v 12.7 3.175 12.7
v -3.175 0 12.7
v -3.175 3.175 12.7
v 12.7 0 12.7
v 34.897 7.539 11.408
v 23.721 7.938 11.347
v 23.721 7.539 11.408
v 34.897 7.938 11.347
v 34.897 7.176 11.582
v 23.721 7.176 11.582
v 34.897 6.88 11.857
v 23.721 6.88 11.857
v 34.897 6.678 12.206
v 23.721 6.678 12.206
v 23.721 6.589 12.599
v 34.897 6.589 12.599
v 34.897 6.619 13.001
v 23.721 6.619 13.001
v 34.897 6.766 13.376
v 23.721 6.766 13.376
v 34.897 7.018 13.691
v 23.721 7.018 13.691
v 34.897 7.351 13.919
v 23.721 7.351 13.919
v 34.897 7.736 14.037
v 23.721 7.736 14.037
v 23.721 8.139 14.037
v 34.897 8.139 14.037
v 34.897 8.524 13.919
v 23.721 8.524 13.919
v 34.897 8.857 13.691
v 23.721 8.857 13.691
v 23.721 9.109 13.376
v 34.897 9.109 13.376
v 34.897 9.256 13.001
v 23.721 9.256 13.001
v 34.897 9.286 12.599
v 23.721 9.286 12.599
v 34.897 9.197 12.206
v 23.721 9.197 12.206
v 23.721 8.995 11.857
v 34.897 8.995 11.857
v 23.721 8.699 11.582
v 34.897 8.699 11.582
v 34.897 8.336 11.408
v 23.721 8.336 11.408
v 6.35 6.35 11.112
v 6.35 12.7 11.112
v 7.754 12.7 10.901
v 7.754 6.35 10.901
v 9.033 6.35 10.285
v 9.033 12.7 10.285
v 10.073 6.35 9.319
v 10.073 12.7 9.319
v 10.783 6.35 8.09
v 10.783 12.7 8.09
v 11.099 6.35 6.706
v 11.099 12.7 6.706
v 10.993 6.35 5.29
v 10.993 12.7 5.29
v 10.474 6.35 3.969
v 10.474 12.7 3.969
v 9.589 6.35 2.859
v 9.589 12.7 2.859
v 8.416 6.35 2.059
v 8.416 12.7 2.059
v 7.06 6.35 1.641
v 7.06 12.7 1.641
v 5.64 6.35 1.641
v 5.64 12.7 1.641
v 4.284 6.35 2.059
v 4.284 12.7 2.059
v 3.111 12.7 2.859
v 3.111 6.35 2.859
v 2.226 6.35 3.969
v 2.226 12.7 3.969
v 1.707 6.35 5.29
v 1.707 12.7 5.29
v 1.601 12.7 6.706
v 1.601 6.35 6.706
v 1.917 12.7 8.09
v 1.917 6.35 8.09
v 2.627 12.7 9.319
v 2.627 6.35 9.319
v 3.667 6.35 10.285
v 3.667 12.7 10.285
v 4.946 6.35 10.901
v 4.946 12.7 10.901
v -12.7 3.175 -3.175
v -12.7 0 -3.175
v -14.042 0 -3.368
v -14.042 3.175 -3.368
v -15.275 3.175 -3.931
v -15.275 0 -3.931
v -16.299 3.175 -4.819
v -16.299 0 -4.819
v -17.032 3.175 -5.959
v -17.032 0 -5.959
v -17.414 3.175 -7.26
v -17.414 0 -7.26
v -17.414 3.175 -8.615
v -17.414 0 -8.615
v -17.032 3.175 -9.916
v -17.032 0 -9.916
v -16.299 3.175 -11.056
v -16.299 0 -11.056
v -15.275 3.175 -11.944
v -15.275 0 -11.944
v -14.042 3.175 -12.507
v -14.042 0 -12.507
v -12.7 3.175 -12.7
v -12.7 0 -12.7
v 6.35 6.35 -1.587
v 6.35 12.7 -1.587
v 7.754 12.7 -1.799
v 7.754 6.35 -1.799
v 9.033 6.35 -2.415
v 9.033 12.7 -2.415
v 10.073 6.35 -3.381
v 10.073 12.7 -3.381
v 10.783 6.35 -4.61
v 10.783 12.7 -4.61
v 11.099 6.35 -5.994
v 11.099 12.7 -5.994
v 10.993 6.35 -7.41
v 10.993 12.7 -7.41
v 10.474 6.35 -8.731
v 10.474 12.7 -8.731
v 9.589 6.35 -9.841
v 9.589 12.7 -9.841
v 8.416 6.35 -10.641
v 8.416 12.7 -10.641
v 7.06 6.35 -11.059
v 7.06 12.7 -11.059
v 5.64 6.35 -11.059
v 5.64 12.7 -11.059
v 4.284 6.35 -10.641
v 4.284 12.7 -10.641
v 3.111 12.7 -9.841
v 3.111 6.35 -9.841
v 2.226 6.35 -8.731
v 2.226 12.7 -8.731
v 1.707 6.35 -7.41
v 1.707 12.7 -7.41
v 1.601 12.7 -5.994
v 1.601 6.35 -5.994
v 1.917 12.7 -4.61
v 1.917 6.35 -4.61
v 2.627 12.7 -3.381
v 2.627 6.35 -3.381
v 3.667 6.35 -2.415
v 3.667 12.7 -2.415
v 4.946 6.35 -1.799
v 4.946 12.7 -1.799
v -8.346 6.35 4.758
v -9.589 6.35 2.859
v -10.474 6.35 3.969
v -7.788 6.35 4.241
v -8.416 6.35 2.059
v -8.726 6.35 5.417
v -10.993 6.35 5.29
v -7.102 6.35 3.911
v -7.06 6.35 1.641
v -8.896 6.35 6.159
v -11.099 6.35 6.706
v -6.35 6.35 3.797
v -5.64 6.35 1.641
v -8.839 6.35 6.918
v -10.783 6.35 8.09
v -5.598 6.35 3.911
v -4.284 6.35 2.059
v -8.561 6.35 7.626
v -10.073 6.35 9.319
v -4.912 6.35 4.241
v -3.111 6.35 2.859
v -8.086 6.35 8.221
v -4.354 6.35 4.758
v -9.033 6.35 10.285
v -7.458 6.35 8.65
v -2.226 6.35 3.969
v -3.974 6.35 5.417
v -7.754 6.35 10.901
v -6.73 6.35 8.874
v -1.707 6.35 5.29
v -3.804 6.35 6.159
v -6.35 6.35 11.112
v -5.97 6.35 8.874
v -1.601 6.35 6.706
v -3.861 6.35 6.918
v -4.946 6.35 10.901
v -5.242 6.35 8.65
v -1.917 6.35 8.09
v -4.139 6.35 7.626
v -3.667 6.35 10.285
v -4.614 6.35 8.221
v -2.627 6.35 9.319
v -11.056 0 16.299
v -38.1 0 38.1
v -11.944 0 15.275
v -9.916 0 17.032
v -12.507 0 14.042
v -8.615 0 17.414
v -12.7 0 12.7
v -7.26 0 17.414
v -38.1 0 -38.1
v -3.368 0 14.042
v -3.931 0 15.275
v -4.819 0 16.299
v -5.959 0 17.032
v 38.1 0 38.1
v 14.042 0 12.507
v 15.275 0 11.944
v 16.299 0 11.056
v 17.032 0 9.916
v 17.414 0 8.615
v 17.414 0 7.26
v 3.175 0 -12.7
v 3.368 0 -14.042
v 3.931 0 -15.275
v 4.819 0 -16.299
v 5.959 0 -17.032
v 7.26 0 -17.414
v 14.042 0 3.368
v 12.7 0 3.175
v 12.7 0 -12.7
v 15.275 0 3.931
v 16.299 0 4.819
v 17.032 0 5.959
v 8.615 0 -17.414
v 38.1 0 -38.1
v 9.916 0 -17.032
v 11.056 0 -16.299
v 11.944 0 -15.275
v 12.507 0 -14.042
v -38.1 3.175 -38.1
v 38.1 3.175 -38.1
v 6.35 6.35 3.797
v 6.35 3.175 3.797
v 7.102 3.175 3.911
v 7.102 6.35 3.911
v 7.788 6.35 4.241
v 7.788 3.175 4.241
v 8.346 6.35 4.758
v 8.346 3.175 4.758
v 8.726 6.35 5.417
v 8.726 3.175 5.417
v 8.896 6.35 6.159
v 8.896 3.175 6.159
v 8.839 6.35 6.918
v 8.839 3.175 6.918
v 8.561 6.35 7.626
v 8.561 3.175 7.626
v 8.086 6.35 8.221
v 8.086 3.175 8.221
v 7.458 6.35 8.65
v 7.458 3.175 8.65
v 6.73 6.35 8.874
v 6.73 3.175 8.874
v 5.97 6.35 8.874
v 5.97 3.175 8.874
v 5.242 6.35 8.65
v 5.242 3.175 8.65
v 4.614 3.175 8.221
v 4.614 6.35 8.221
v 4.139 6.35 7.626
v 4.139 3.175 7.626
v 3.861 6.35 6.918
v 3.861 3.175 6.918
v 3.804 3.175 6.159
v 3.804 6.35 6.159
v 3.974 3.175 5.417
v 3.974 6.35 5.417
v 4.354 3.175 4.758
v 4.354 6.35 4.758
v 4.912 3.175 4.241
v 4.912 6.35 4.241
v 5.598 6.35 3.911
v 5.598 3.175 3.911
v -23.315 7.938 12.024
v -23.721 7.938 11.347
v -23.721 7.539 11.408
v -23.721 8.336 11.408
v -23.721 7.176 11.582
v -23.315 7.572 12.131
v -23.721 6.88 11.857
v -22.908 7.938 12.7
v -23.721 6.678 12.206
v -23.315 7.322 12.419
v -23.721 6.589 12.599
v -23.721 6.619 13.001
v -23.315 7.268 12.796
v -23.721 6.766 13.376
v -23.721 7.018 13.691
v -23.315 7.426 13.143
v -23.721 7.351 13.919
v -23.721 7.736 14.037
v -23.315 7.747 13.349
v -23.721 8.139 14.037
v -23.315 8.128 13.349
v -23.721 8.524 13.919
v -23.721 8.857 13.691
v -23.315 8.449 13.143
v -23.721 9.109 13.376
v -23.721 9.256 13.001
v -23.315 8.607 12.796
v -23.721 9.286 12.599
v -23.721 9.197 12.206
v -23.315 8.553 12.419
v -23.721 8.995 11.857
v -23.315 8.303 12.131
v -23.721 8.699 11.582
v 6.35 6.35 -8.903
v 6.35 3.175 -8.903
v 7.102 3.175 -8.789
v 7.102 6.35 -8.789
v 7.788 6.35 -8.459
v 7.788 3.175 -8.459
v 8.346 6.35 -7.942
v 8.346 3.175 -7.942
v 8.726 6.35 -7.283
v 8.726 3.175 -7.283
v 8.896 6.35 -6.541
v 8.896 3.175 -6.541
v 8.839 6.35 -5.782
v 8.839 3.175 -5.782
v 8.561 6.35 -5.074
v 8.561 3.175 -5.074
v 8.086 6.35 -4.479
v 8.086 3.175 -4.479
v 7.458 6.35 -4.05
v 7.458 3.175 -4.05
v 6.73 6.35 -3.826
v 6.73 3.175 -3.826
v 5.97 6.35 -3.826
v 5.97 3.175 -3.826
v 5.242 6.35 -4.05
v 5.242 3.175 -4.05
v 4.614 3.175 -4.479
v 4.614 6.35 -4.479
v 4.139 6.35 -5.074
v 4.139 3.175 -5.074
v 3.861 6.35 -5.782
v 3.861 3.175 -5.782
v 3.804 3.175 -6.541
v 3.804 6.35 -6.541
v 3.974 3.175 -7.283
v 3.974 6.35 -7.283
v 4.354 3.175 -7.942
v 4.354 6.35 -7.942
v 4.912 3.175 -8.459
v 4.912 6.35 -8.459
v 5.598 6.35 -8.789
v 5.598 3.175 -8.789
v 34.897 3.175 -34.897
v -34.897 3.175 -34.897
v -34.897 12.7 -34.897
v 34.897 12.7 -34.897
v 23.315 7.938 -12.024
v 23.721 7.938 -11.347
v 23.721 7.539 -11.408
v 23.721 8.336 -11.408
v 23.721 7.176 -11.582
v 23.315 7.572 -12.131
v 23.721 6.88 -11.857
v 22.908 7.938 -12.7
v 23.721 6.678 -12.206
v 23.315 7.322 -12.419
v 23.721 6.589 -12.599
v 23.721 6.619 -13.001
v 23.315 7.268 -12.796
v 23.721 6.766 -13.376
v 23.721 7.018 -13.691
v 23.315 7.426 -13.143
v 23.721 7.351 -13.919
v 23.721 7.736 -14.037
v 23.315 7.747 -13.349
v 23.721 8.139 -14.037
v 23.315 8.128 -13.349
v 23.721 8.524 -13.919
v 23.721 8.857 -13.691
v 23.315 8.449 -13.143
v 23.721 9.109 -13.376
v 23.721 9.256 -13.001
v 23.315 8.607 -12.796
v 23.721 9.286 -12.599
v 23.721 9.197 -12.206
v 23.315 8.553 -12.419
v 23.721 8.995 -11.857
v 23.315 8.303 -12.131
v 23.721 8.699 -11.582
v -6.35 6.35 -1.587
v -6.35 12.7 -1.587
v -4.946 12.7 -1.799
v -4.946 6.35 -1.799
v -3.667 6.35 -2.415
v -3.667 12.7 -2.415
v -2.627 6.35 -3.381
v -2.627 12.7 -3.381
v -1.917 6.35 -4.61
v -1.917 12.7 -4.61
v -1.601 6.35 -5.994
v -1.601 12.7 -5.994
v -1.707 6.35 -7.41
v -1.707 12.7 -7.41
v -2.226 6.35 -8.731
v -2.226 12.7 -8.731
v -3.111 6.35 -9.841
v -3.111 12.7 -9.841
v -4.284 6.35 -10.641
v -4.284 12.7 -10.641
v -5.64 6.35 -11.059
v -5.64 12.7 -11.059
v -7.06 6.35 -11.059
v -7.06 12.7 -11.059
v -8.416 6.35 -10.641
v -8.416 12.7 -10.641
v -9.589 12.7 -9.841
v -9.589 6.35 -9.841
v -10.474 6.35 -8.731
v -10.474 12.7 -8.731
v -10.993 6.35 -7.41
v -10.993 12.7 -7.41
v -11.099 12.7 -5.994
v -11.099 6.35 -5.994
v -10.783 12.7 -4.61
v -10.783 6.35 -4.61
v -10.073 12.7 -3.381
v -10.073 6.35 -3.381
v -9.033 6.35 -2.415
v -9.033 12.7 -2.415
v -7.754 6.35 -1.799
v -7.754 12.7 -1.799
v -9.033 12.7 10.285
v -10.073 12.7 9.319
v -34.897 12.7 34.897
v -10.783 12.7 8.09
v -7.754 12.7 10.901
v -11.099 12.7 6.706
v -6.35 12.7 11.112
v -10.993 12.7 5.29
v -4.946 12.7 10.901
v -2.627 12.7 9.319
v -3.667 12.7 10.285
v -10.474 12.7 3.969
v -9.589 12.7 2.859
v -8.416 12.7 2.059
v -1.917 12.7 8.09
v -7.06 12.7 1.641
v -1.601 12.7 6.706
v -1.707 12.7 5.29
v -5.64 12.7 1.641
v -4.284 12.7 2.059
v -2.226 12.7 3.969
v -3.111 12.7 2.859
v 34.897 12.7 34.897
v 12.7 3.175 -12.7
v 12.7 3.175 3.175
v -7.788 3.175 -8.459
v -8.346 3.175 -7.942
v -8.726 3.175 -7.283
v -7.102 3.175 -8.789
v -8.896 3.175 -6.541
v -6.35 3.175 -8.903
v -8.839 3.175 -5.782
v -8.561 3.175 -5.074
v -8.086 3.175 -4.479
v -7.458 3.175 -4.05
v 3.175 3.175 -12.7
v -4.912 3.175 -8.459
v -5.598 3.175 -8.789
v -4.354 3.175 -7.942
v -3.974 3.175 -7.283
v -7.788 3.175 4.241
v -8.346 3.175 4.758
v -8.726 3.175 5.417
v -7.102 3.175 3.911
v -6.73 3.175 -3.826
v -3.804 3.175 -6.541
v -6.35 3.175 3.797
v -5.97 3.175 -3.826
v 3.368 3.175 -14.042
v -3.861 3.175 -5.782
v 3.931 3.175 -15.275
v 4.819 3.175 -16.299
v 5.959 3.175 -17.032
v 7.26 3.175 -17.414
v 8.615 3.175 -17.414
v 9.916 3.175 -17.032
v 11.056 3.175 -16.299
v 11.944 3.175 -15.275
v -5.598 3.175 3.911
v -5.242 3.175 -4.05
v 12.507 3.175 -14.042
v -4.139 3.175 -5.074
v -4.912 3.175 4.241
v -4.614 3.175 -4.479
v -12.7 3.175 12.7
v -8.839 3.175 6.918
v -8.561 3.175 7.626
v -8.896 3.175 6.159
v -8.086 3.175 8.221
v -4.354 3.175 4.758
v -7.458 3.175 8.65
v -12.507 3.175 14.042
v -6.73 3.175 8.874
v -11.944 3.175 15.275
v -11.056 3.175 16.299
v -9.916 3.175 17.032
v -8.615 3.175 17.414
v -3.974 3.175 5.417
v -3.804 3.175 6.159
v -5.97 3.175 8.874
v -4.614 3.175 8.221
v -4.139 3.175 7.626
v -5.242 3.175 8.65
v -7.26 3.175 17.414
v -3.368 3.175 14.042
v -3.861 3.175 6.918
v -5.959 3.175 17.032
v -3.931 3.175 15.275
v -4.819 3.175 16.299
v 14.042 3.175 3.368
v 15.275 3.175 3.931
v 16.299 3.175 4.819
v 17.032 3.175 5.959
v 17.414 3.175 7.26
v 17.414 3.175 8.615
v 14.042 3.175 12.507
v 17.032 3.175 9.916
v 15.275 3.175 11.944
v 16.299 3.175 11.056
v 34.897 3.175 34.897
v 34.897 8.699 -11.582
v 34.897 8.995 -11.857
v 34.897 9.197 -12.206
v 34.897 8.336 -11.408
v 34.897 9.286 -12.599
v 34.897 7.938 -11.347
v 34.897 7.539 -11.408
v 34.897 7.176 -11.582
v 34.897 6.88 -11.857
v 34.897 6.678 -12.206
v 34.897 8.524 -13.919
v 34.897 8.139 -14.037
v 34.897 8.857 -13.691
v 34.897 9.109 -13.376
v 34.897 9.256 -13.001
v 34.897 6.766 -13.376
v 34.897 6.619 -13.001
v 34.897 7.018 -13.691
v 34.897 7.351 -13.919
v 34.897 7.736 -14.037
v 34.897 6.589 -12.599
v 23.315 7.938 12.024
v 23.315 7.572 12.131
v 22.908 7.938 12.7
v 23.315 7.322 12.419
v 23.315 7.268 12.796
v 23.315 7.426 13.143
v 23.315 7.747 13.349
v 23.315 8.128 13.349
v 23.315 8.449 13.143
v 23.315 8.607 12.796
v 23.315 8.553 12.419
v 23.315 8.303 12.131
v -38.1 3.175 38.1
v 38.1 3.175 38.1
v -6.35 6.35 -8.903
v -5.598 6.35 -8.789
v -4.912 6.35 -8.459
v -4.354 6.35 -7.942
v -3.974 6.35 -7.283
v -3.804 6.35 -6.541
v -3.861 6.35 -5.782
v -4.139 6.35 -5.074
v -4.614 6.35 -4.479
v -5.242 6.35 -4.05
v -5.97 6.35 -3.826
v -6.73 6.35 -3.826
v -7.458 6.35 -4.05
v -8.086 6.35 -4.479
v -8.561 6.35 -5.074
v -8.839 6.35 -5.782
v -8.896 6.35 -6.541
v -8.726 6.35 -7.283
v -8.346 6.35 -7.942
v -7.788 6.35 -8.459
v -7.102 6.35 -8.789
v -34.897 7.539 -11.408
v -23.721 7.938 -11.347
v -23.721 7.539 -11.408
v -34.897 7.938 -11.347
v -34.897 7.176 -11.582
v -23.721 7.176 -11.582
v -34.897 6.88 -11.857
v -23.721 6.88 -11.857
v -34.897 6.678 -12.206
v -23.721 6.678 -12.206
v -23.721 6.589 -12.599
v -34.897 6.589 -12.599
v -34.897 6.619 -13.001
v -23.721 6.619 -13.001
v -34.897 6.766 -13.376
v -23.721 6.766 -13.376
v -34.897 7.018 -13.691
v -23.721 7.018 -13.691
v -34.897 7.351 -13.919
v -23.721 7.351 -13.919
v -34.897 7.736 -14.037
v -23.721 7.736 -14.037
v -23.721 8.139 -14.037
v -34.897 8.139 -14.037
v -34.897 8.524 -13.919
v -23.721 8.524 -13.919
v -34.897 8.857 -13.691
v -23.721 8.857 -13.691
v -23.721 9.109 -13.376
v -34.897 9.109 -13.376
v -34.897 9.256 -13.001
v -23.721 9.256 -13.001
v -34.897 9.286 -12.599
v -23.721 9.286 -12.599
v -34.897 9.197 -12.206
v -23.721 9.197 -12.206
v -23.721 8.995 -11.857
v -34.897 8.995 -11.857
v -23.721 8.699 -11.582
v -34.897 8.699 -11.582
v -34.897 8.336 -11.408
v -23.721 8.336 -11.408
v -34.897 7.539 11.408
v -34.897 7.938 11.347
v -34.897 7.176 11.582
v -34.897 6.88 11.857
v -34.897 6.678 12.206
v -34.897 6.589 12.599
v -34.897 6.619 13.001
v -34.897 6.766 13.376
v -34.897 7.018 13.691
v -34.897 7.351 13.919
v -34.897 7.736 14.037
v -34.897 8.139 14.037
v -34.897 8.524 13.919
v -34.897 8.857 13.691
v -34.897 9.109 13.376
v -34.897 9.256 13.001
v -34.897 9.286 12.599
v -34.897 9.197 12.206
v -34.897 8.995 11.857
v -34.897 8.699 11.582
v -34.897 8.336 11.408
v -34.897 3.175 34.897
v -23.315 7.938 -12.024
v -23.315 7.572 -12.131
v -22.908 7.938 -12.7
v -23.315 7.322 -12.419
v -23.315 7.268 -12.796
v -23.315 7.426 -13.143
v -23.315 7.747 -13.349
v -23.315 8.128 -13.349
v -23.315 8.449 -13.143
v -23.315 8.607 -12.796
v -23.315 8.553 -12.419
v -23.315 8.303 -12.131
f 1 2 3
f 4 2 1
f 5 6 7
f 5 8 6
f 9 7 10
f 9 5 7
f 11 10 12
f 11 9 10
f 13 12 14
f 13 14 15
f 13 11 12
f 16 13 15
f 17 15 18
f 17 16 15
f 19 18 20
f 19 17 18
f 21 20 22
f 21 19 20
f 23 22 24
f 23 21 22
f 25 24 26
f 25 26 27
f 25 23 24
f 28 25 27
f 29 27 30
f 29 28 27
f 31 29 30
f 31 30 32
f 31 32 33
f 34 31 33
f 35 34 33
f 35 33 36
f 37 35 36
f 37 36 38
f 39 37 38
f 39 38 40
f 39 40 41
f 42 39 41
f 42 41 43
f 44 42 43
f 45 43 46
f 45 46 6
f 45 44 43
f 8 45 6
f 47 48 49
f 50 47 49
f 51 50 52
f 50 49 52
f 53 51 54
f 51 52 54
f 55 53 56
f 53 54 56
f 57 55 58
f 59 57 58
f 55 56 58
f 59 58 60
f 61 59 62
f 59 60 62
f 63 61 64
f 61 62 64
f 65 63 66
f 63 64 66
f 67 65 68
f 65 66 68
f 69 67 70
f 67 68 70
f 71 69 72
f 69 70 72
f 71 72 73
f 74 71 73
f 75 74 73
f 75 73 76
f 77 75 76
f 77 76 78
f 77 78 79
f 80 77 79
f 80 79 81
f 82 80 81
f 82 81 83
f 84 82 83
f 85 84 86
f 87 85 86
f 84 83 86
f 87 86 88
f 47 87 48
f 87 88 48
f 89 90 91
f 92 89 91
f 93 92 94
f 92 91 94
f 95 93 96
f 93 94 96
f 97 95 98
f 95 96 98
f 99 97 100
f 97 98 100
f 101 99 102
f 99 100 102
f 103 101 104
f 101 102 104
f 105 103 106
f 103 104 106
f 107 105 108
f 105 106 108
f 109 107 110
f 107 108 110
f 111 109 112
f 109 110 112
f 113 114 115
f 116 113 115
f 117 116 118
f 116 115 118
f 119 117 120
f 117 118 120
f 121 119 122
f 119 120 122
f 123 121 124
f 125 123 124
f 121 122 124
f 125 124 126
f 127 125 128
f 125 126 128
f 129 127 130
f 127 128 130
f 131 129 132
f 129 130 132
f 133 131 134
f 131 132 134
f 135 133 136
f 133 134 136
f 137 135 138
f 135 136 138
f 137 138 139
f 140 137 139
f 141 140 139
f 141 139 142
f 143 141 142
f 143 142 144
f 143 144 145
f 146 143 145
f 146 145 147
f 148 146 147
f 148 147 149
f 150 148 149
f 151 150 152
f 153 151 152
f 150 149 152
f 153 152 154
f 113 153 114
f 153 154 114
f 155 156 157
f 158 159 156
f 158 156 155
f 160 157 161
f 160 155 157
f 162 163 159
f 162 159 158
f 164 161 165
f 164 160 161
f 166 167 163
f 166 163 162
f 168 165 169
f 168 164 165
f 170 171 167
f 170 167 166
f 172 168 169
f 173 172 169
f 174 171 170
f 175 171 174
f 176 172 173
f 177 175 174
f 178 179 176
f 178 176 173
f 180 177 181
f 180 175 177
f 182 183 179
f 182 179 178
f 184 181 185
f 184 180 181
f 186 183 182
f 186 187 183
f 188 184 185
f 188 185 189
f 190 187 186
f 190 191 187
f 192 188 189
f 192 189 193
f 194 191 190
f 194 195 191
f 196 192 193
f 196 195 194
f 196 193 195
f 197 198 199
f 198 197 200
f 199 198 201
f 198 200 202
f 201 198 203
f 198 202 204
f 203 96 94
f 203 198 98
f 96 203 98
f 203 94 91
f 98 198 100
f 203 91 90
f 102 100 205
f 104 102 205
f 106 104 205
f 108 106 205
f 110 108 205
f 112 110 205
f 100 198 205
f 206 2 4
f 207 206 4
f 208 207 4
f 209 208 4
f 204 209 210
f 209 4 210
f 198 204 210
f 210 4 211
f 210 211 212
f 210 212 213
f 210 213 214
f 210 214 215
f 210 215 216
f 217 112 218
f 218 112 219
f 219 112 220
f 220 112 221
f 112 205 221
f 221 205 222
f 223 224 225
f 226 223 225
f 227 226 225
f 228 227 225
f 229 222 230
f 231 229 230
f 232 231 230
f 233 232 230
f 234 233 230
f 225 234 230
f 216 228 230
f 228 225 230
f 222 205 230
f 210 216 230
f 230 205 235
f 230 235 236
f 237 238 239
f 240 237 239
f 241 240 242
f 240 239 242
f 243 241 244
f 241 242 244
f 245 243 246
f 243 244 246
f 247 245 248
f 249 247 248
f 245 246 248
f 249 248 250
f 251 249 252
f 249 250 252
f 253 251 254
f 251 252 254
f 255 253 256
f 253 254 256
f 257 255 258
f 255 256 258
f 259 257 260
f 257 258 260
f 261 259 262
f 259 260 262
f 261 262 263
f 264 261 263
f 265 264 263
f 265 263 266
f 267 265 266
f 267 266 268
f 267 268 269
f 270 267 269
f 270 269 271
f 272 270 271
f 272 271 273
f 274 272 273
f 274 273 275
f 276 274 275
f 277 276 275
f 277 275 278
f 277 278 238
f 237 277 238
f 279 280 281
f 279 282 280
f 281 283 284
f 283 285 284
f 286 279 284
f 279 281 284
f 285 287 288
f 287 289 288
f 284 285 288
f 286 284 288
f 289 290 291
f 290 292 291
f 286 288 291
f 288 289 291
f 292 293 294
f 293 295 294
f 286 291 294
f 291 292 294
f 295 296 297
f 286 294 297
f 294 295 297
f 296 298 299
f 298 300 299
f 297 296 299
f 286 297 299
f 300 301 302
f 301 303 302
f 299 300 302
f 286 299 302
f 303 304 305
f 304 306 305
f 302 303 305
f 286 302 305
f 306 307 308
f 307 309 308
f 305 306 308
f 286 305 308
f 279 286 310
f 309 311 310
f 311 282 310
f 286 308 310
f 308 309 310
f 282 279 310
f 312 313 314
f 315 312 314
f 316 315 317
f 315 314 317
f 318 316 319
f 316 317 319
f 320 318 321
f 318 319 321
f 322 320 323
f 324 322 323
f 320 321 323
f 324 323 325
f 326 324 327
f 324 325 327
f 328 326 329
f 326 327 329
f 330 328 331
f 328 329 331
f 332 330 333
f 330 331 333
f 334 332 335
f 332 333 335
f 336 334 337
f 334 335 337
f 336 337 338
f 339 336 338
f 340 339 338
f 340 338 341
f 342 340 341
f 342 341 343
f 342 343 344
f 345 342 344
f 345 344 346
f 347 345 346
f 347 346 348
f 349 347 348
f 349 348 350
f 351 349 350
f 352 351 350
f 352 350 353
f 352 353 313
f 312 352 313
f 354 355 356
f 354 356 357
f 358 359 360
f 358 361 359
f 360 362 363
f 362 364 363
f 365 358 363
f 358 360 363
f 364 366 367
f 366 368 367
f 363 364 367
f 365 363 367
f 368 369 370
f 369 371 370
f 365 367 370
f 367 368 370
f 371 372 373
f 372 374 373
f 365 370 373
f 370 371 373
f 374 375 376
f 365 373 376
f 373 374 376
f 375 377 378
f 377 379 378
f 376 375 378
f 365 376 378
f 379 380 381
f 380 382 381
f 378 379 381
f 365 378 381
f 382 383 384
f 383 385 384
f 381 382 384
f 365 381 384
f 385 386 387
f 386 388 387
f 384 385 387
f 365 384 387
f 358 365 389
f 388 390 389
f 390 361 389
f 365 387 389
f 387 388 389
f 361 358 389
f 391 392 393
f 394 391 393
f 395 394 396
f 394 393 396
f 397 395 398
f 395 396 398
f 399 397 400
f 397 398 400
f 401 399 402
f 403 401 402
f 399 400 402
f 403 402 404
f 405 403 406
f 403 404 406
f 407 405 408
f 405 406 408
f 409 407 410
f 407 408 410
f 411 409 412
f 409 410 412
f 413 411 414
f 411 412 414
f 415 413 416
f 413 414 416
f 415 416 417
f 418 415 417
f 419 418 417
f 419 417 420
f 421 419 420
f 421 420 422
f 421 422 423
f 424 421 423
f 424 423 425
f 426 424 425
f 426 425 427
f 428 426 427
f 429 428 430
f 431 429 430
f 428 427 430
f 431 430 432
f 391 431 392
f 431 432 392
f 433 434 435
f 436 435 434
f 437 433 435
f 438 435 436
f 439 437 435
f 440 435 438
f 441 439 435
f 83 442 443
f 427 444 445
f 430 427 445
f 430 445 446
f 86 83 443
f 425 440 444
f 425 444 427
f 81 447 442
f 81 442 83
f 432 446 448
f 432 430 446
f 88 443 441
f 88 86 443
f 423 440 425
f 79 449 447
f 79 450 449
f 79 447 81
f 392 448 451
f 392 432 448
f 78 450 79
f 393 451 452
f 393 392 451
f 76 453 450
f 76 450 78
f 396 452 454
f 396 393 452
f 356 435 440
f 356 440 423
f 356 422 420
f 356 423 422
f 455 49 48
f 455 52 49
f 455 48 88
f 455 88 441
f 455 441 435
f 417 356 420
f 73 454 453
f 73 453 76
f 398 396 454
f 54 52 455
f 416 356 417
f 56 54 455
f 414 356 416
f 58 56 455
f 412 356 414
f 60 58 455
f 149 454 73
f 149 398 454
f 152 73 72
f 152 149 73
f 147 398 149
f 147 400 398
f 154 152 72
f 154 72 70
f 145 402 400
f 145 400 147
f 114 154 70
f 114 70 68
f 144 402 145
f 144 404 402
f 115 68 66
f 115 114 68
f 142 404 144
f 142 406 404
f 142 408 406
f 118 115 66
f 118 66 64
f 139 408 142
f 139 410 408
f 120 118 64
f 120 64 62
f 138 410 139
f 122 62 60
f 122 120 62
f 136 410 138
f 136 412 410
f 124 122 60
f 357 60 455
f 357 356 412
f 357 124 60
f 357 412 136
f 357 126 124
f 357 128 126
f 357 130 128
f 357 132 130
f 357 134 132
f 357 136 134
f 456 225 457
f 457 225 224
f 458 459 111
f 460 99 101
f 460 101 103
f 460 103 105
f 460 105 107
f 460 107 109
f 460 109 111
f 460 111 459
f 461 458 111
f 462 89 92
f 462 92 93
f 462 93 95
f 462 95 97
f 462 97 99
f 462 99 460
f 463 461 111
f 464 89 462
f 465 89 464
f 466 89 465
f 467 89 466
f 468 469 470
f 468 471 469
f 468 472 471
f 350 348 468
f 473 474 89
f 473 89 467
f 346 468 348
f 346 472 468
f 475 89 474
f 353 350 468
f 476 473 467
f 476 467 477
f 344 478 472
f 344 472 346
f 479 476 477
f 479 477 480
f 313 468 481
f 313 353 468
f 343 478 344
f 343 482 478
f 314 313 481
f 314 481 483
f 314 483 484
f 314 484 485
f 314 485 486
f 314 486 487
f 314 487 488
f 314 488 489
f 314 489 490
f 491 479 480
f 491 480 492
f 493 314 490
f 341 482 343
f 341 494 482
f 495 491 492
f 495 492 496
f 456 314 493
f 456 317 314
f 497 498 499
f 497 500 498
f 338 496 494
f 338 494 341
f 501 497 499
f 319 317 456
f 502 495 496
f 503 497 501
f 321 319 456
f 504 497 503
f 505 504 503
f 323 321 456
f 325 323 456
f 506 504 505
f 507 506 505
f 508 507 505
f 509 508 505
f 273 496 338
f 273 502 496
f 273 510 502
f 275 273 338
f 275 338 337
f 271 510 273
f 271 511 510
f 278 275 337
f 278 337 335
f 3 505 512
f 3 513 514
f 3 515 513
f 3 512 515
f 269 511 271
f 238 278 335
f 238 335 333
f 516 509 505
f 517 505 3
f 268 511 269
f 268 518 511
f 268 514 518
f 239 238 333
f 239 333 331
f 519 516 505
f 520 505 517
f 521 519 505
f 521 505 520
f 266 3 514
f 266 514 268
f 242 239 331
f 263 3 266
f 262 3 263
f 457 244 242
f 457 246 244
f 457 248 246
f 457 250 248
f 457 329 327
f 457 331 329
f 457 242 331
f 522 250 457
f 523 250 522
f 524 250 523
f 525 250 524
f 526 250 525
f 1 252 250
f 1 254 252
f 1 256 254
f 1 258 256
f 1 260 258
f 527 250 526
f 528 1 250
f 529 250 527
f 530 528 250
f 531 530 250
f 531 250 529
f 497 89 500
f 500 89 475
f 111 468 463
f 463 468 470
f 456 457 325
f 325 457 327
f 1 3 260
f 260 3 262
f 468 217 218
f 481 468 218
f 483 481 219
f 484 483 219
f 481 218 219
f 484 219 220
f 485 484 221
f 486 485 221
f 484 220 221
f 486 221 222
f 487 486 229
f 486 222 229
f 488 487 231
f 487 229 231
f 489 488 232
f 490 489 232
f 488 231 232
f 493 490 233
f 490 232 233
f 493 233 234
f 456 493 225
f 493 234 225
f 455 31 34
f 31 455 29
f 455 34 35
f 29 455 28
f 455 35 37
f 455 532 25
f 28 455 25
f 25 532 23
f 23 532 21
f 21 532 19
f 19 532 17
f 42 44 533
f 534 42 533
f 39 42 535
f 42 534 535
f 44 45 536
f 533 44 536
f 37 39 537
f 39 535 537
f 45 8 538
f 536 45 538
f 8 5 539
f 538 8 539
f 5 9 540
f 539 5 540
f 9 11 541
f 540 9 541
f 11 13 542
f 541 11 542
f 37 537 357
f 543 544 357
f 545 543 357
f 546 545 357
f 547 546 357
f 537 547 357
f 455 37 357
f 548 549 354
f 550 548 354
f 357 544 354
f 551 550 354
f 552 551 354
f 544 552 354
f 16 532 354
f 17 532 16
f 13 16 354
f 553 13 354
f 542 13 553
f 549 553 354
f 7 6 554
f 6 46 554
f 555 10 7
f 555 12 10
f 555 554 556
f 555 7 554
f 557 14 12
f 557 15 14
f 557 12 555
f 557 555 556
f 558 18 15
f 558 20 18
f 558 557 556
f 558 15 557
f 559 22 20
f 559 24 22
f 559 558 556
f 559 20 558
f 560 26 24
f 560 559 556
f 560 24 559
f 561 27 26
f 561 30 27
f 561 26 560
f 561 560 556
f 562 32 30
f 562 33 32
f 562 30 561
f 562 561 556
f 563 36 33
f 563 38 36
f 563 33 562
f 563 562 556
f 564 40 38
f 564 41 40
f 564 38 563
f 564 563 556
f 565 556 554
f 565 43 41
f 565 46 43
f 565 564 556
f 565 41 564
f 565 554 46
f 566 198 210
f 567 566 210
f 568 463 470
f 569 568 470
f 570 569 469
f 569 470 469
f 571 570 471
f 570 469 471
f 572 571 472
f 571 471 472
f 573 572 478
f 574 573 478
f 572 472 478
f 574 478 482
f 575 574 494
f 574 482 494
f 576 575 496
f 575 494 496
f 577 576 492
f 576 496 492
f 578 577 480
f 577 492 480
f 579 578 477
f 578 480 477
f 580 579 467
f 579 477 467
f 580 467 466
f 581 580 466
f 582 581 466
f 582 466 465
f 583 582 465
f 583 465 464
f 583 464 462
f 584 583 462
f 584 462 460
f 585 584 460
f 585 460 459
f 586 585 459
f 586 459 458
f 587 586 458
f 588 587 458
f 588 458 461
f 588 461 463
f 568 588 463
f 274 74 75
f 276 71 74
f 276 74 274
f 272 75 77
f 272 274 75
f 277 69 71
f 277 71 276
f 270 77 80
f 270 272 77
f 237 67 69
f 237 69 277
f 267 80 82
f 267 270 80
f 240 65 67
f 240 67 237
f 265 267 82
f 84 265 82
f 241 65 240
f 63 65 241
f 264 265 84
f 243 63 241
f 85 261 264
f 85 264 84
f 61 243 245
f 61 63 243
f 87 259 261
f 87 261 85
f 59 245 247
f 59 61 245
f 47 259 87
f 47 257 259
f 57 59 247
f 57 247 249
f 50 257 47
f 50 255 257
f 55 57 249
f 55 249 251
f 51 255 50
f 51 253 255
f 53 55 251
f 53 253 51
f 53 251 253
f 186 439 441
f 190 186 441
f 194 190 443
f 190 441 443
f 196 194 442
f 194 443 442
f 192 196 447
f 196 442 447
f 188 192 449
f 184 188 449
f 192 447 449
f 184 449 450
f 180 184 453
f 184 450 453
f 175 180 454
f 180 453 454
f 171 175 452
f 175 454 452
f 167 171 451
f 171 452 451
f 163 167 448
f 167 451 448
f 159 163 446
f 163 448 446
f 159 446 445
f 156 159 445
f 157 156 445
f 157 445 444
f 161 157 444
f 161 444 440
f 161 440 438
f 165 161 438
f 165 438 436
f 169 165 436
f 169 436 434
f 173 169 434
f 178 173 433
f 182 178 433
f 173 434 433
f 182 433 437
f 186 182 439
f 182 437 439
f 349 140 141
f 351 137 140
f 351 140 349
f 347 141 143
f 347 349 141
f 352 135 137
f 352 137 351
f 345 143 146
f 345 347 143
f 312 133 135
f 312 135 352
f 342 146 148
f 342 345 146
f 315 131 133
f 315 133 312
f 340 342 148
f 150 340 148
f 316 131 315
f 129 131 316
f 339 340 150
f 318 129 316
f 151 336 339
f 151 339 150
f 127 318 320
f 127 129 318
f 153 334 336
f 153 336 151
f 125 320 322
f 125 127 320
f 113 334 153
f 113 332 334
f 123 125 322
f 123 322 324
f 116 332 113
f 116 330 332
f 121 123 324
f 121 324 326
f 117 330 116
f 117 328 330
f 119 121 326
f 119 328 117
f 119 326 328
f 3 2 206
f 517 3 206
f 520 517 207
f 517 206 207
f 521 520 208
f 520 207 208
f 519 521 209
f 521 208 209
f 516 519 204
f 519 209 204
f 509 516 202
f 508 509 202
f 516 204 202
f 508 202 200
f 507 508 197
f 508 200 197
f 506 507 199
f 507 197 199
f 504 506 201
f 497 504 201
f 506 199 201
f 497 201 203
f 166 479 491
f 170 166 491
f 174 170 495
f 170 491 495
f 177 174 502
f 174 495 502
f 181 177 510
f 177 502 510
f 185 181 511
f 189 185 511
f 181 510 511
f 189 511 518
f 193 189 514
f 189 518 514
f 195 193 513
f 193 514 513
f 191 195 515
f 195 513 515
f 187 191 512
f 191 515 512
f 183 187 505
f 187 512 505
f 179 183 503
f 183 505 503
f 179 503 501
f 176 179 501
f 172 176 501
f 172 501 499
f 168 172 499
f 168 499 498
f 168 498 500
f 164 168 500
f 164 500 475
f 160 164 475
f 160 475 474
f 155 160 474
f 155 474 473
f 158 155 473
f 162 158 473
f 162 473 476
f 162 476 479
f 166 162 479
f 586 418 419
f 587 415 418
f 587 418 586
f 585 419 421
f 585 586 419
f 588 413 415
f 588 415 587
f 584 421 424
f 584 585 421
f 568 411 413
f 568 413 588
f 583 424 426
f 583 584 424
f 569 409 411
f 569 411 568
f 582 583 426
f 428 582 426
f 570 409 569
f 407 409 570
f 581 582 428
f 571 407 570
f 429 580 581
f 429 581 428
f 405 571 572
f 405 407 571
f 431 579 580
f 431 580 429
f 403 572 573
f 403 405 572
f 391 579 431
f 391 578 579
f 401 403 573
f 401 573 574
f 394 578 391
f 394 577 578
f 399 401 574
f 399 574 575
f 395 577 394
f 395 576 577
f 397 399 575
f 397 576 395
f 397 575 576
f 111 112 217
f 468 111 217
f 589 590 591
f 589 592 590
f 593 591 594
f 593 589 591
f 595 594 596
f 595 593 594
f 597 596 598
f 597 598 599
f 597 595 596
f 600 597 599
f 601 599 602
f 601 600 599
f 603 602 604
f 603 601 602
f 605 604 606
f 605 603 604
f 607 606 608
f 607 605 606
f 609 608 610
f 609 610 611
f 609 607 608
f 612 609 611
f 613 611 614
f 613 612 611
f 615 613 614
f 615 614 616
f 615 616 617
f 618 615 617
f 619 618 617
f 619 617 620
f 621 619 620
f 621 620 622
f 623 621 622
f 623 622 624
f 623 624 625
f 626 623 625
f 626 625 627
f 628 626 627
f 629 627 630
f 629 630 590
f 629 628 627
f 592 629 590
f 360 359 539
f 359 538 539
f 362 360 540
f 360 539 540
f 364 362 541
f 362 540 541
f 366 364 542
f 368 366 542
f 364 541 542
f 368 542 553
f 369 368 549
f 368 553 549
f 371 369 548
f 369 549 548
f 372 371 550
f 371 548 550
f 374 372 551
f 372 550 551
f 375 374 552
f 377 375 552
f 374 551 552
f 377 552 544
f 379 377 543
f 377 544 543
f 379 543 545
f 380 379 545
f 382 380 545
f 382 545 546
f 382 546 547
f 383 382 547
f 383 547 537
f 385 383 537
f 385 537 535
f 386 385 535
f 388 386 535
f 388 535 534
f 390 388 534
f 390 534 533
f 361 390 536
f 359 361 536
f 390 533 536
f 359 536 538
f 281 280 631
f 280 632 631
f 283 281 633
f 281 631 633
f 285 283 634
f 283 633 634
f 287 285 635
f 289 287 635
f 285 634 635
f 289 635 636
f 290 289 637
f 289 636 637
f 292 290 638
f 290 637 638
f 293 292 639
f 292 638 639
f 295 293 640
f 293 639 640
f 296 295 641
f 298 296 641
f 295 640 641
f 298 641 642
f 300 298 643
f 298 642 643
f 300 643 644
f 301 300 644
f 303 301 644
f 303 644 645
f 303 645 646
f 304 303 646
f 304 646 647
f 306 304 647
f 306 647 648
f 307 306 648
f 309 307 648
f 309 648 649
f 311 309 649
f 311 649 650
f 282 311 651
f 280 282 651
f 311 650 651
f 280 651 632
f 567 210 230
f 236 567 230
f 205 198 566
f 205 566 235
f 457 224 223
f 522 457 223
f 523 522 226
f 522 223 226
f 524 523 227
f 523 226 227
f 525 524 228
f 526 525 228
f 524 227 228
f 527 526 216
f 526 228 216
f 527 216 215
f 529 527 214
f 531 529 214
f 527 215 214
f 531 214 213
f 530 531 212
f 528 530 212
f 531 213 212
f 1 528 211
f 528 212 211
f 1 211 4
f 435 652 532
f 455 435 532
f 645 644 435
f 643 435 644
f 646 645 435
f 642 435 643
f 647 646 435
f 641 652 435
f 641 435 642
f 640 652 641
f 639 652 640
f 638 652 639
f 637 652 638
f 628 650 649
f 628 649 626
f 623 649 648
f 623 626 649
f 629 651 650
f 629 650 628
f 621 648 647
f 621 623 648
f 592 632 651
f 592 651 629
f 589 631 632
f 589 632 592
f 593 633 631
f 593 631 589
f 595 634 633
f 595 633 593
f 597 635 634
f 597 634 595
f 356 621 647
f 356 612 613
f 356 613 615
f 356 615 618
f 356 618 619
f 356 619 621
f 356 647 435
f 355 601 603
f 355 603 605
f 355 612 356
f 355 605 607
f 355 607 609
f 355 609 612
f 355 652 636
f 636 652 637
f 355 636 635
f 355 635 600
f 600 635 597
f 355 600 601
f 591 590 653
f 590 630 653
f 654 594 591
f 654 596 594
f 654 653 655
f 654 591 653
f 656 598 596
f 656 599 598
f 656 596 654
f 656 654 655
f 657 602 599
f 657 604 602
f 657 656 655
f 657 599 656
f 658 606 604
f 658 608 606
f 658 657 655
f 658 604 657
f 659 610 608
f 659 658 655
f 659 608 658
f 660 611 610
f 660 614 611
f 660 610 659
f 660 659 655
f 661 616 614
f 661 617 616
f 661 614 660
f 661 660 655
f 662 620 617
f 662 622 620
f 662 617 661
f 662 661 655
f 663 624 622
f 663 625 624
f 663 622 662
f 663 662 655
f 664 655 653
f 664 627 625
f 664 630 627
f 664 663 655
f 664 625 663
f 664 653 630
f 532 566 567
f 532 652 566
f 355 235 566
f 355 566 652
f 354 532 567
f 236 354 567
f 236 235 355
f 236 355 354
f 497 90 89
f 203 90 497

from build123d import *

# Parameters (mm, degrees)
SKETCH1_W           = 76.2
SKETCH1_H           = 76.2
BOSS_EXTRUDE1_DEPTH = 3.175
SKETCH2_W           = 69.79412
SKETCH2_H           = 69.79412
SKETCH2_W_2         = 57.09412
SKETCH2_H_2         = 57.09412
BOSS_EXTRUDE2_DEPTH = 9.525
SKETCH13_R          = 4.7625
SKETCH13_W          = 25.4
SKETCH13_H          = 25.4
CUT_EXTRUDE1_DEPTH  = 3.175
SKETCH15_R          = 2.5527
CUT_EXTRUDE2_DEPTH  = 55.716959208
SKETCH17_R          = 4.7625
CUT_EXTRUDE3_DEPTH  = 6.35


with BuildPart() as part:
    # Sketch1 → Boss-Extrude1 (new body)
    with BuildSketch(Plane(origin=(0, 0, 0), x_dir=(1, 0, 0), z_dir=(0, 1, 0))):
        Rectangle(SKETCH1_W, SKETCH1_H)
    extrude(amount=BOSS_EXTRUDE1_DEPTH)

    # Sketch2 → Boss-Extrude2 (add)
    # profile 1 of 2: a face of its own
    with BuildSketch(Plane(origin=(0, 3.175, 0), x_dir=(1, 0, 0), z_dir=(0, 1, 0))):
        Rectangle(SKETCH2_W, SKETCH2_H)
        Rectangle(SKETCH2_W_2, SKETCH2_H_2, mode=Mode.SUBTRACT)
    # profile 2 of 2: a face of its own
    with BuildSketch(Plane(origin=(0, 3.175, 0), x_dir=(1, 0, 0), z_dir=(0, 1, 0))):
        Rectangle(SKETCH2_W_2, SKETCH2_H_2)
    extrude(amount=BOSS_EXTRUDE2_DEPTH)

    # Sketch9 → #6-32 Tapped Hole2 (revolve, cut)
    with BuildSketch(Plane(origin=(34.89706, 7.9375, 12.7), x_dir=(0, 0, -1), z_dir=(0, 1, 0))):
        Polygon((0, 0), (0, 11.98869403), (1.35255, 11.176), (1.35255, 0), align=None)
    f_6_32_tapped_hole2 = revolve(axis=Axis((41.24706, 7.9375, 12.7), (-1, 0, 0)), mode=Mode.SUBTRACT)

    # Mirror1: #6-32 Tapped Hole2 across plane
    add(f_6_32_tapped_hole2.mirror(Plane.XY), mode=Mode.SUBTRACT)

    # Mirror2: #6-32 Tapped Hole2 across plane
    add(f_6_32_tapped_hole2.mirror(Plane(origin=(0, 0, 0), x_dir=(0, 0, 1), z_dir=(1, 0, 0))), mode=Mode.SUBTRACT)

    # Mirror2 copy 1 sketch → Mirror2 copy 1 (revolve, cut)
    with BuildSketch(Plane(origin=(-34.89706, 7.9375, -12.7), x_dir=(0, 0, 1), z_dir=(0, 1, 0))):
        Polygon((0, 0), (0, 11.98869403), (1.35255, 11.176), (1.35255, 0), align=None)
    revolve(axis=Axis((-41.24706, 7.9375, -12.7), (1, 0, 0)), mode=Mode.SUBTRACT)

    # Sketch13 → Cut-Extrude1 (cut)
    with BuildSketch(Plane.XZ):
        with Locations((-12.7, -7.9375)):
            Circle(SKETCH13_R)
        with Locations((7.9375, -12.7)):
            Circle(SKETCH13_R)
        with Locations((12.7, 7.9375)):
            Circle(SKETCH13_R)
        with Locations((-7.9375, 12.7)):
            Circle(SKETCH13_R)
        Rectangle(SKETCH13_W, SKETCH13_H)
        with BuildLine():
            ThreePointArc((12.7, 12.7), (7.9375, 7.9375), (12.7, 3.175))
            Line((12.7, 3.175), (12.7, 12.7))
        make_face()
        with BuildLine():
            Line((12.7, 12.7), (12.7, 3.175))
            ThreePointArc((12.7, 3.175), (16.067596045, 4.569903955), (17.4625, 7.9375))
            ThreePointArc((17.4625, 7.9375), (16.067596045, 11.305096045), (12.7, 12.7))
        make_face()
        with BuildLine():
            ThreePointArc((-3.175, 12.7), (-7.9375, 17.4625), (-12.7, 12.7))
            Line((-12.7, 12.7), (-3.175, 12.7))
        make_face()
        with BuildLine():
            Line((-3.175, 12.7), (-12.7, 12.7))
            ThreePointArc((-12.7, 12.7), (-7.9375, 7.9375), (-3.175, 12.7))
        make_face()
        with BuildLine():
            ThreePointArc((-12.7, -3.175), (-17.4625, -7.9375), (-12.7, -12.7))
            Line((-12.7, -12.7), (-12.7, -3.175))
        make_face()
        with BuildLine():
            Line((-12.7, -3.175), (-12.7, -12.7))
            ThreePointArc((-12.7, -12.7), (-9.332403955, -11.305096045), (-7.9375, -7.9375))
            ThreePointArc((-7.9375, -7.9375), (-9.332403955, -4.569903955), (-12.7, -3.175))
        make_face()
        with BuildLine():
            ThreePointArc((12.7, -12.7), (7.9375, -7.9375), (3.175, -12.7))
            Line((3.175, -12.7), (12.7, -12.7))
        make_face()
        with BuildLine():
            Line((12.7, -12.7), (3.175, -12.7))
            ThreePointArc((3.175, -12.7), (7.9375, -17.4625), (12.7, -12.7))
        make_face()
    extrude(amount=-CUT_EXTRUDE1_DEPTH, mode=Mode.SUBTRACT)

    # Sketch15 → Cut-Extrude2 (cut, through all)
    with BuildSketch(Plane.XZ.offset(-3.175)):
        with Locations(Location((-6.35, 6.35, 0), (0, 0, 270))):
            Circle(SKETCH15_R)
        with Locations(Location((6.35, 6.35, 0), (0, 0, 270))):
            Circle(SKETCH15_R)
        with Locations(Location((6.35, -6.35, 0), (0, 0, 270))):
            Circle(SKETCH15_R)
        with Locations(Location((-6.35, -6.35, 0), (0, 0, 270))):
            Circle(SKETCH15_R)
    extrude(amount=-CUT_EXTRUDE2_DEPTH, mode=Mode.SUBTRACT)

    # Sketch17 → Cut-Extrude3 (cut)
    with BuildSketch(Plane(origin=(0, 12.7, 0), x_dir=(1, 0, 0), z_dir=(0, 1, 0))):
        with Locations(Location((-6.35, 6.35, 0), (0, 0, 270))):
            Circle(SKETCH17_R)
        with Locations(Location((6.35, 6.35, 0), (0, 0, 270))):
            Circle(SKETCH17_R)
        with Locations(Location((6.35, -6.35, 0), (0, 0, 270))):
            Circle(SKETCH17_R)
        with Locations(Location((-6.35, -6.35, 0), (0, 0, 270))):
            Circle(SKETCH17_R)
    extrude(amount=-CUT_EXTRUDE3_DEPTH, mode=Mode.SUBTRACT)


solid = part.part
